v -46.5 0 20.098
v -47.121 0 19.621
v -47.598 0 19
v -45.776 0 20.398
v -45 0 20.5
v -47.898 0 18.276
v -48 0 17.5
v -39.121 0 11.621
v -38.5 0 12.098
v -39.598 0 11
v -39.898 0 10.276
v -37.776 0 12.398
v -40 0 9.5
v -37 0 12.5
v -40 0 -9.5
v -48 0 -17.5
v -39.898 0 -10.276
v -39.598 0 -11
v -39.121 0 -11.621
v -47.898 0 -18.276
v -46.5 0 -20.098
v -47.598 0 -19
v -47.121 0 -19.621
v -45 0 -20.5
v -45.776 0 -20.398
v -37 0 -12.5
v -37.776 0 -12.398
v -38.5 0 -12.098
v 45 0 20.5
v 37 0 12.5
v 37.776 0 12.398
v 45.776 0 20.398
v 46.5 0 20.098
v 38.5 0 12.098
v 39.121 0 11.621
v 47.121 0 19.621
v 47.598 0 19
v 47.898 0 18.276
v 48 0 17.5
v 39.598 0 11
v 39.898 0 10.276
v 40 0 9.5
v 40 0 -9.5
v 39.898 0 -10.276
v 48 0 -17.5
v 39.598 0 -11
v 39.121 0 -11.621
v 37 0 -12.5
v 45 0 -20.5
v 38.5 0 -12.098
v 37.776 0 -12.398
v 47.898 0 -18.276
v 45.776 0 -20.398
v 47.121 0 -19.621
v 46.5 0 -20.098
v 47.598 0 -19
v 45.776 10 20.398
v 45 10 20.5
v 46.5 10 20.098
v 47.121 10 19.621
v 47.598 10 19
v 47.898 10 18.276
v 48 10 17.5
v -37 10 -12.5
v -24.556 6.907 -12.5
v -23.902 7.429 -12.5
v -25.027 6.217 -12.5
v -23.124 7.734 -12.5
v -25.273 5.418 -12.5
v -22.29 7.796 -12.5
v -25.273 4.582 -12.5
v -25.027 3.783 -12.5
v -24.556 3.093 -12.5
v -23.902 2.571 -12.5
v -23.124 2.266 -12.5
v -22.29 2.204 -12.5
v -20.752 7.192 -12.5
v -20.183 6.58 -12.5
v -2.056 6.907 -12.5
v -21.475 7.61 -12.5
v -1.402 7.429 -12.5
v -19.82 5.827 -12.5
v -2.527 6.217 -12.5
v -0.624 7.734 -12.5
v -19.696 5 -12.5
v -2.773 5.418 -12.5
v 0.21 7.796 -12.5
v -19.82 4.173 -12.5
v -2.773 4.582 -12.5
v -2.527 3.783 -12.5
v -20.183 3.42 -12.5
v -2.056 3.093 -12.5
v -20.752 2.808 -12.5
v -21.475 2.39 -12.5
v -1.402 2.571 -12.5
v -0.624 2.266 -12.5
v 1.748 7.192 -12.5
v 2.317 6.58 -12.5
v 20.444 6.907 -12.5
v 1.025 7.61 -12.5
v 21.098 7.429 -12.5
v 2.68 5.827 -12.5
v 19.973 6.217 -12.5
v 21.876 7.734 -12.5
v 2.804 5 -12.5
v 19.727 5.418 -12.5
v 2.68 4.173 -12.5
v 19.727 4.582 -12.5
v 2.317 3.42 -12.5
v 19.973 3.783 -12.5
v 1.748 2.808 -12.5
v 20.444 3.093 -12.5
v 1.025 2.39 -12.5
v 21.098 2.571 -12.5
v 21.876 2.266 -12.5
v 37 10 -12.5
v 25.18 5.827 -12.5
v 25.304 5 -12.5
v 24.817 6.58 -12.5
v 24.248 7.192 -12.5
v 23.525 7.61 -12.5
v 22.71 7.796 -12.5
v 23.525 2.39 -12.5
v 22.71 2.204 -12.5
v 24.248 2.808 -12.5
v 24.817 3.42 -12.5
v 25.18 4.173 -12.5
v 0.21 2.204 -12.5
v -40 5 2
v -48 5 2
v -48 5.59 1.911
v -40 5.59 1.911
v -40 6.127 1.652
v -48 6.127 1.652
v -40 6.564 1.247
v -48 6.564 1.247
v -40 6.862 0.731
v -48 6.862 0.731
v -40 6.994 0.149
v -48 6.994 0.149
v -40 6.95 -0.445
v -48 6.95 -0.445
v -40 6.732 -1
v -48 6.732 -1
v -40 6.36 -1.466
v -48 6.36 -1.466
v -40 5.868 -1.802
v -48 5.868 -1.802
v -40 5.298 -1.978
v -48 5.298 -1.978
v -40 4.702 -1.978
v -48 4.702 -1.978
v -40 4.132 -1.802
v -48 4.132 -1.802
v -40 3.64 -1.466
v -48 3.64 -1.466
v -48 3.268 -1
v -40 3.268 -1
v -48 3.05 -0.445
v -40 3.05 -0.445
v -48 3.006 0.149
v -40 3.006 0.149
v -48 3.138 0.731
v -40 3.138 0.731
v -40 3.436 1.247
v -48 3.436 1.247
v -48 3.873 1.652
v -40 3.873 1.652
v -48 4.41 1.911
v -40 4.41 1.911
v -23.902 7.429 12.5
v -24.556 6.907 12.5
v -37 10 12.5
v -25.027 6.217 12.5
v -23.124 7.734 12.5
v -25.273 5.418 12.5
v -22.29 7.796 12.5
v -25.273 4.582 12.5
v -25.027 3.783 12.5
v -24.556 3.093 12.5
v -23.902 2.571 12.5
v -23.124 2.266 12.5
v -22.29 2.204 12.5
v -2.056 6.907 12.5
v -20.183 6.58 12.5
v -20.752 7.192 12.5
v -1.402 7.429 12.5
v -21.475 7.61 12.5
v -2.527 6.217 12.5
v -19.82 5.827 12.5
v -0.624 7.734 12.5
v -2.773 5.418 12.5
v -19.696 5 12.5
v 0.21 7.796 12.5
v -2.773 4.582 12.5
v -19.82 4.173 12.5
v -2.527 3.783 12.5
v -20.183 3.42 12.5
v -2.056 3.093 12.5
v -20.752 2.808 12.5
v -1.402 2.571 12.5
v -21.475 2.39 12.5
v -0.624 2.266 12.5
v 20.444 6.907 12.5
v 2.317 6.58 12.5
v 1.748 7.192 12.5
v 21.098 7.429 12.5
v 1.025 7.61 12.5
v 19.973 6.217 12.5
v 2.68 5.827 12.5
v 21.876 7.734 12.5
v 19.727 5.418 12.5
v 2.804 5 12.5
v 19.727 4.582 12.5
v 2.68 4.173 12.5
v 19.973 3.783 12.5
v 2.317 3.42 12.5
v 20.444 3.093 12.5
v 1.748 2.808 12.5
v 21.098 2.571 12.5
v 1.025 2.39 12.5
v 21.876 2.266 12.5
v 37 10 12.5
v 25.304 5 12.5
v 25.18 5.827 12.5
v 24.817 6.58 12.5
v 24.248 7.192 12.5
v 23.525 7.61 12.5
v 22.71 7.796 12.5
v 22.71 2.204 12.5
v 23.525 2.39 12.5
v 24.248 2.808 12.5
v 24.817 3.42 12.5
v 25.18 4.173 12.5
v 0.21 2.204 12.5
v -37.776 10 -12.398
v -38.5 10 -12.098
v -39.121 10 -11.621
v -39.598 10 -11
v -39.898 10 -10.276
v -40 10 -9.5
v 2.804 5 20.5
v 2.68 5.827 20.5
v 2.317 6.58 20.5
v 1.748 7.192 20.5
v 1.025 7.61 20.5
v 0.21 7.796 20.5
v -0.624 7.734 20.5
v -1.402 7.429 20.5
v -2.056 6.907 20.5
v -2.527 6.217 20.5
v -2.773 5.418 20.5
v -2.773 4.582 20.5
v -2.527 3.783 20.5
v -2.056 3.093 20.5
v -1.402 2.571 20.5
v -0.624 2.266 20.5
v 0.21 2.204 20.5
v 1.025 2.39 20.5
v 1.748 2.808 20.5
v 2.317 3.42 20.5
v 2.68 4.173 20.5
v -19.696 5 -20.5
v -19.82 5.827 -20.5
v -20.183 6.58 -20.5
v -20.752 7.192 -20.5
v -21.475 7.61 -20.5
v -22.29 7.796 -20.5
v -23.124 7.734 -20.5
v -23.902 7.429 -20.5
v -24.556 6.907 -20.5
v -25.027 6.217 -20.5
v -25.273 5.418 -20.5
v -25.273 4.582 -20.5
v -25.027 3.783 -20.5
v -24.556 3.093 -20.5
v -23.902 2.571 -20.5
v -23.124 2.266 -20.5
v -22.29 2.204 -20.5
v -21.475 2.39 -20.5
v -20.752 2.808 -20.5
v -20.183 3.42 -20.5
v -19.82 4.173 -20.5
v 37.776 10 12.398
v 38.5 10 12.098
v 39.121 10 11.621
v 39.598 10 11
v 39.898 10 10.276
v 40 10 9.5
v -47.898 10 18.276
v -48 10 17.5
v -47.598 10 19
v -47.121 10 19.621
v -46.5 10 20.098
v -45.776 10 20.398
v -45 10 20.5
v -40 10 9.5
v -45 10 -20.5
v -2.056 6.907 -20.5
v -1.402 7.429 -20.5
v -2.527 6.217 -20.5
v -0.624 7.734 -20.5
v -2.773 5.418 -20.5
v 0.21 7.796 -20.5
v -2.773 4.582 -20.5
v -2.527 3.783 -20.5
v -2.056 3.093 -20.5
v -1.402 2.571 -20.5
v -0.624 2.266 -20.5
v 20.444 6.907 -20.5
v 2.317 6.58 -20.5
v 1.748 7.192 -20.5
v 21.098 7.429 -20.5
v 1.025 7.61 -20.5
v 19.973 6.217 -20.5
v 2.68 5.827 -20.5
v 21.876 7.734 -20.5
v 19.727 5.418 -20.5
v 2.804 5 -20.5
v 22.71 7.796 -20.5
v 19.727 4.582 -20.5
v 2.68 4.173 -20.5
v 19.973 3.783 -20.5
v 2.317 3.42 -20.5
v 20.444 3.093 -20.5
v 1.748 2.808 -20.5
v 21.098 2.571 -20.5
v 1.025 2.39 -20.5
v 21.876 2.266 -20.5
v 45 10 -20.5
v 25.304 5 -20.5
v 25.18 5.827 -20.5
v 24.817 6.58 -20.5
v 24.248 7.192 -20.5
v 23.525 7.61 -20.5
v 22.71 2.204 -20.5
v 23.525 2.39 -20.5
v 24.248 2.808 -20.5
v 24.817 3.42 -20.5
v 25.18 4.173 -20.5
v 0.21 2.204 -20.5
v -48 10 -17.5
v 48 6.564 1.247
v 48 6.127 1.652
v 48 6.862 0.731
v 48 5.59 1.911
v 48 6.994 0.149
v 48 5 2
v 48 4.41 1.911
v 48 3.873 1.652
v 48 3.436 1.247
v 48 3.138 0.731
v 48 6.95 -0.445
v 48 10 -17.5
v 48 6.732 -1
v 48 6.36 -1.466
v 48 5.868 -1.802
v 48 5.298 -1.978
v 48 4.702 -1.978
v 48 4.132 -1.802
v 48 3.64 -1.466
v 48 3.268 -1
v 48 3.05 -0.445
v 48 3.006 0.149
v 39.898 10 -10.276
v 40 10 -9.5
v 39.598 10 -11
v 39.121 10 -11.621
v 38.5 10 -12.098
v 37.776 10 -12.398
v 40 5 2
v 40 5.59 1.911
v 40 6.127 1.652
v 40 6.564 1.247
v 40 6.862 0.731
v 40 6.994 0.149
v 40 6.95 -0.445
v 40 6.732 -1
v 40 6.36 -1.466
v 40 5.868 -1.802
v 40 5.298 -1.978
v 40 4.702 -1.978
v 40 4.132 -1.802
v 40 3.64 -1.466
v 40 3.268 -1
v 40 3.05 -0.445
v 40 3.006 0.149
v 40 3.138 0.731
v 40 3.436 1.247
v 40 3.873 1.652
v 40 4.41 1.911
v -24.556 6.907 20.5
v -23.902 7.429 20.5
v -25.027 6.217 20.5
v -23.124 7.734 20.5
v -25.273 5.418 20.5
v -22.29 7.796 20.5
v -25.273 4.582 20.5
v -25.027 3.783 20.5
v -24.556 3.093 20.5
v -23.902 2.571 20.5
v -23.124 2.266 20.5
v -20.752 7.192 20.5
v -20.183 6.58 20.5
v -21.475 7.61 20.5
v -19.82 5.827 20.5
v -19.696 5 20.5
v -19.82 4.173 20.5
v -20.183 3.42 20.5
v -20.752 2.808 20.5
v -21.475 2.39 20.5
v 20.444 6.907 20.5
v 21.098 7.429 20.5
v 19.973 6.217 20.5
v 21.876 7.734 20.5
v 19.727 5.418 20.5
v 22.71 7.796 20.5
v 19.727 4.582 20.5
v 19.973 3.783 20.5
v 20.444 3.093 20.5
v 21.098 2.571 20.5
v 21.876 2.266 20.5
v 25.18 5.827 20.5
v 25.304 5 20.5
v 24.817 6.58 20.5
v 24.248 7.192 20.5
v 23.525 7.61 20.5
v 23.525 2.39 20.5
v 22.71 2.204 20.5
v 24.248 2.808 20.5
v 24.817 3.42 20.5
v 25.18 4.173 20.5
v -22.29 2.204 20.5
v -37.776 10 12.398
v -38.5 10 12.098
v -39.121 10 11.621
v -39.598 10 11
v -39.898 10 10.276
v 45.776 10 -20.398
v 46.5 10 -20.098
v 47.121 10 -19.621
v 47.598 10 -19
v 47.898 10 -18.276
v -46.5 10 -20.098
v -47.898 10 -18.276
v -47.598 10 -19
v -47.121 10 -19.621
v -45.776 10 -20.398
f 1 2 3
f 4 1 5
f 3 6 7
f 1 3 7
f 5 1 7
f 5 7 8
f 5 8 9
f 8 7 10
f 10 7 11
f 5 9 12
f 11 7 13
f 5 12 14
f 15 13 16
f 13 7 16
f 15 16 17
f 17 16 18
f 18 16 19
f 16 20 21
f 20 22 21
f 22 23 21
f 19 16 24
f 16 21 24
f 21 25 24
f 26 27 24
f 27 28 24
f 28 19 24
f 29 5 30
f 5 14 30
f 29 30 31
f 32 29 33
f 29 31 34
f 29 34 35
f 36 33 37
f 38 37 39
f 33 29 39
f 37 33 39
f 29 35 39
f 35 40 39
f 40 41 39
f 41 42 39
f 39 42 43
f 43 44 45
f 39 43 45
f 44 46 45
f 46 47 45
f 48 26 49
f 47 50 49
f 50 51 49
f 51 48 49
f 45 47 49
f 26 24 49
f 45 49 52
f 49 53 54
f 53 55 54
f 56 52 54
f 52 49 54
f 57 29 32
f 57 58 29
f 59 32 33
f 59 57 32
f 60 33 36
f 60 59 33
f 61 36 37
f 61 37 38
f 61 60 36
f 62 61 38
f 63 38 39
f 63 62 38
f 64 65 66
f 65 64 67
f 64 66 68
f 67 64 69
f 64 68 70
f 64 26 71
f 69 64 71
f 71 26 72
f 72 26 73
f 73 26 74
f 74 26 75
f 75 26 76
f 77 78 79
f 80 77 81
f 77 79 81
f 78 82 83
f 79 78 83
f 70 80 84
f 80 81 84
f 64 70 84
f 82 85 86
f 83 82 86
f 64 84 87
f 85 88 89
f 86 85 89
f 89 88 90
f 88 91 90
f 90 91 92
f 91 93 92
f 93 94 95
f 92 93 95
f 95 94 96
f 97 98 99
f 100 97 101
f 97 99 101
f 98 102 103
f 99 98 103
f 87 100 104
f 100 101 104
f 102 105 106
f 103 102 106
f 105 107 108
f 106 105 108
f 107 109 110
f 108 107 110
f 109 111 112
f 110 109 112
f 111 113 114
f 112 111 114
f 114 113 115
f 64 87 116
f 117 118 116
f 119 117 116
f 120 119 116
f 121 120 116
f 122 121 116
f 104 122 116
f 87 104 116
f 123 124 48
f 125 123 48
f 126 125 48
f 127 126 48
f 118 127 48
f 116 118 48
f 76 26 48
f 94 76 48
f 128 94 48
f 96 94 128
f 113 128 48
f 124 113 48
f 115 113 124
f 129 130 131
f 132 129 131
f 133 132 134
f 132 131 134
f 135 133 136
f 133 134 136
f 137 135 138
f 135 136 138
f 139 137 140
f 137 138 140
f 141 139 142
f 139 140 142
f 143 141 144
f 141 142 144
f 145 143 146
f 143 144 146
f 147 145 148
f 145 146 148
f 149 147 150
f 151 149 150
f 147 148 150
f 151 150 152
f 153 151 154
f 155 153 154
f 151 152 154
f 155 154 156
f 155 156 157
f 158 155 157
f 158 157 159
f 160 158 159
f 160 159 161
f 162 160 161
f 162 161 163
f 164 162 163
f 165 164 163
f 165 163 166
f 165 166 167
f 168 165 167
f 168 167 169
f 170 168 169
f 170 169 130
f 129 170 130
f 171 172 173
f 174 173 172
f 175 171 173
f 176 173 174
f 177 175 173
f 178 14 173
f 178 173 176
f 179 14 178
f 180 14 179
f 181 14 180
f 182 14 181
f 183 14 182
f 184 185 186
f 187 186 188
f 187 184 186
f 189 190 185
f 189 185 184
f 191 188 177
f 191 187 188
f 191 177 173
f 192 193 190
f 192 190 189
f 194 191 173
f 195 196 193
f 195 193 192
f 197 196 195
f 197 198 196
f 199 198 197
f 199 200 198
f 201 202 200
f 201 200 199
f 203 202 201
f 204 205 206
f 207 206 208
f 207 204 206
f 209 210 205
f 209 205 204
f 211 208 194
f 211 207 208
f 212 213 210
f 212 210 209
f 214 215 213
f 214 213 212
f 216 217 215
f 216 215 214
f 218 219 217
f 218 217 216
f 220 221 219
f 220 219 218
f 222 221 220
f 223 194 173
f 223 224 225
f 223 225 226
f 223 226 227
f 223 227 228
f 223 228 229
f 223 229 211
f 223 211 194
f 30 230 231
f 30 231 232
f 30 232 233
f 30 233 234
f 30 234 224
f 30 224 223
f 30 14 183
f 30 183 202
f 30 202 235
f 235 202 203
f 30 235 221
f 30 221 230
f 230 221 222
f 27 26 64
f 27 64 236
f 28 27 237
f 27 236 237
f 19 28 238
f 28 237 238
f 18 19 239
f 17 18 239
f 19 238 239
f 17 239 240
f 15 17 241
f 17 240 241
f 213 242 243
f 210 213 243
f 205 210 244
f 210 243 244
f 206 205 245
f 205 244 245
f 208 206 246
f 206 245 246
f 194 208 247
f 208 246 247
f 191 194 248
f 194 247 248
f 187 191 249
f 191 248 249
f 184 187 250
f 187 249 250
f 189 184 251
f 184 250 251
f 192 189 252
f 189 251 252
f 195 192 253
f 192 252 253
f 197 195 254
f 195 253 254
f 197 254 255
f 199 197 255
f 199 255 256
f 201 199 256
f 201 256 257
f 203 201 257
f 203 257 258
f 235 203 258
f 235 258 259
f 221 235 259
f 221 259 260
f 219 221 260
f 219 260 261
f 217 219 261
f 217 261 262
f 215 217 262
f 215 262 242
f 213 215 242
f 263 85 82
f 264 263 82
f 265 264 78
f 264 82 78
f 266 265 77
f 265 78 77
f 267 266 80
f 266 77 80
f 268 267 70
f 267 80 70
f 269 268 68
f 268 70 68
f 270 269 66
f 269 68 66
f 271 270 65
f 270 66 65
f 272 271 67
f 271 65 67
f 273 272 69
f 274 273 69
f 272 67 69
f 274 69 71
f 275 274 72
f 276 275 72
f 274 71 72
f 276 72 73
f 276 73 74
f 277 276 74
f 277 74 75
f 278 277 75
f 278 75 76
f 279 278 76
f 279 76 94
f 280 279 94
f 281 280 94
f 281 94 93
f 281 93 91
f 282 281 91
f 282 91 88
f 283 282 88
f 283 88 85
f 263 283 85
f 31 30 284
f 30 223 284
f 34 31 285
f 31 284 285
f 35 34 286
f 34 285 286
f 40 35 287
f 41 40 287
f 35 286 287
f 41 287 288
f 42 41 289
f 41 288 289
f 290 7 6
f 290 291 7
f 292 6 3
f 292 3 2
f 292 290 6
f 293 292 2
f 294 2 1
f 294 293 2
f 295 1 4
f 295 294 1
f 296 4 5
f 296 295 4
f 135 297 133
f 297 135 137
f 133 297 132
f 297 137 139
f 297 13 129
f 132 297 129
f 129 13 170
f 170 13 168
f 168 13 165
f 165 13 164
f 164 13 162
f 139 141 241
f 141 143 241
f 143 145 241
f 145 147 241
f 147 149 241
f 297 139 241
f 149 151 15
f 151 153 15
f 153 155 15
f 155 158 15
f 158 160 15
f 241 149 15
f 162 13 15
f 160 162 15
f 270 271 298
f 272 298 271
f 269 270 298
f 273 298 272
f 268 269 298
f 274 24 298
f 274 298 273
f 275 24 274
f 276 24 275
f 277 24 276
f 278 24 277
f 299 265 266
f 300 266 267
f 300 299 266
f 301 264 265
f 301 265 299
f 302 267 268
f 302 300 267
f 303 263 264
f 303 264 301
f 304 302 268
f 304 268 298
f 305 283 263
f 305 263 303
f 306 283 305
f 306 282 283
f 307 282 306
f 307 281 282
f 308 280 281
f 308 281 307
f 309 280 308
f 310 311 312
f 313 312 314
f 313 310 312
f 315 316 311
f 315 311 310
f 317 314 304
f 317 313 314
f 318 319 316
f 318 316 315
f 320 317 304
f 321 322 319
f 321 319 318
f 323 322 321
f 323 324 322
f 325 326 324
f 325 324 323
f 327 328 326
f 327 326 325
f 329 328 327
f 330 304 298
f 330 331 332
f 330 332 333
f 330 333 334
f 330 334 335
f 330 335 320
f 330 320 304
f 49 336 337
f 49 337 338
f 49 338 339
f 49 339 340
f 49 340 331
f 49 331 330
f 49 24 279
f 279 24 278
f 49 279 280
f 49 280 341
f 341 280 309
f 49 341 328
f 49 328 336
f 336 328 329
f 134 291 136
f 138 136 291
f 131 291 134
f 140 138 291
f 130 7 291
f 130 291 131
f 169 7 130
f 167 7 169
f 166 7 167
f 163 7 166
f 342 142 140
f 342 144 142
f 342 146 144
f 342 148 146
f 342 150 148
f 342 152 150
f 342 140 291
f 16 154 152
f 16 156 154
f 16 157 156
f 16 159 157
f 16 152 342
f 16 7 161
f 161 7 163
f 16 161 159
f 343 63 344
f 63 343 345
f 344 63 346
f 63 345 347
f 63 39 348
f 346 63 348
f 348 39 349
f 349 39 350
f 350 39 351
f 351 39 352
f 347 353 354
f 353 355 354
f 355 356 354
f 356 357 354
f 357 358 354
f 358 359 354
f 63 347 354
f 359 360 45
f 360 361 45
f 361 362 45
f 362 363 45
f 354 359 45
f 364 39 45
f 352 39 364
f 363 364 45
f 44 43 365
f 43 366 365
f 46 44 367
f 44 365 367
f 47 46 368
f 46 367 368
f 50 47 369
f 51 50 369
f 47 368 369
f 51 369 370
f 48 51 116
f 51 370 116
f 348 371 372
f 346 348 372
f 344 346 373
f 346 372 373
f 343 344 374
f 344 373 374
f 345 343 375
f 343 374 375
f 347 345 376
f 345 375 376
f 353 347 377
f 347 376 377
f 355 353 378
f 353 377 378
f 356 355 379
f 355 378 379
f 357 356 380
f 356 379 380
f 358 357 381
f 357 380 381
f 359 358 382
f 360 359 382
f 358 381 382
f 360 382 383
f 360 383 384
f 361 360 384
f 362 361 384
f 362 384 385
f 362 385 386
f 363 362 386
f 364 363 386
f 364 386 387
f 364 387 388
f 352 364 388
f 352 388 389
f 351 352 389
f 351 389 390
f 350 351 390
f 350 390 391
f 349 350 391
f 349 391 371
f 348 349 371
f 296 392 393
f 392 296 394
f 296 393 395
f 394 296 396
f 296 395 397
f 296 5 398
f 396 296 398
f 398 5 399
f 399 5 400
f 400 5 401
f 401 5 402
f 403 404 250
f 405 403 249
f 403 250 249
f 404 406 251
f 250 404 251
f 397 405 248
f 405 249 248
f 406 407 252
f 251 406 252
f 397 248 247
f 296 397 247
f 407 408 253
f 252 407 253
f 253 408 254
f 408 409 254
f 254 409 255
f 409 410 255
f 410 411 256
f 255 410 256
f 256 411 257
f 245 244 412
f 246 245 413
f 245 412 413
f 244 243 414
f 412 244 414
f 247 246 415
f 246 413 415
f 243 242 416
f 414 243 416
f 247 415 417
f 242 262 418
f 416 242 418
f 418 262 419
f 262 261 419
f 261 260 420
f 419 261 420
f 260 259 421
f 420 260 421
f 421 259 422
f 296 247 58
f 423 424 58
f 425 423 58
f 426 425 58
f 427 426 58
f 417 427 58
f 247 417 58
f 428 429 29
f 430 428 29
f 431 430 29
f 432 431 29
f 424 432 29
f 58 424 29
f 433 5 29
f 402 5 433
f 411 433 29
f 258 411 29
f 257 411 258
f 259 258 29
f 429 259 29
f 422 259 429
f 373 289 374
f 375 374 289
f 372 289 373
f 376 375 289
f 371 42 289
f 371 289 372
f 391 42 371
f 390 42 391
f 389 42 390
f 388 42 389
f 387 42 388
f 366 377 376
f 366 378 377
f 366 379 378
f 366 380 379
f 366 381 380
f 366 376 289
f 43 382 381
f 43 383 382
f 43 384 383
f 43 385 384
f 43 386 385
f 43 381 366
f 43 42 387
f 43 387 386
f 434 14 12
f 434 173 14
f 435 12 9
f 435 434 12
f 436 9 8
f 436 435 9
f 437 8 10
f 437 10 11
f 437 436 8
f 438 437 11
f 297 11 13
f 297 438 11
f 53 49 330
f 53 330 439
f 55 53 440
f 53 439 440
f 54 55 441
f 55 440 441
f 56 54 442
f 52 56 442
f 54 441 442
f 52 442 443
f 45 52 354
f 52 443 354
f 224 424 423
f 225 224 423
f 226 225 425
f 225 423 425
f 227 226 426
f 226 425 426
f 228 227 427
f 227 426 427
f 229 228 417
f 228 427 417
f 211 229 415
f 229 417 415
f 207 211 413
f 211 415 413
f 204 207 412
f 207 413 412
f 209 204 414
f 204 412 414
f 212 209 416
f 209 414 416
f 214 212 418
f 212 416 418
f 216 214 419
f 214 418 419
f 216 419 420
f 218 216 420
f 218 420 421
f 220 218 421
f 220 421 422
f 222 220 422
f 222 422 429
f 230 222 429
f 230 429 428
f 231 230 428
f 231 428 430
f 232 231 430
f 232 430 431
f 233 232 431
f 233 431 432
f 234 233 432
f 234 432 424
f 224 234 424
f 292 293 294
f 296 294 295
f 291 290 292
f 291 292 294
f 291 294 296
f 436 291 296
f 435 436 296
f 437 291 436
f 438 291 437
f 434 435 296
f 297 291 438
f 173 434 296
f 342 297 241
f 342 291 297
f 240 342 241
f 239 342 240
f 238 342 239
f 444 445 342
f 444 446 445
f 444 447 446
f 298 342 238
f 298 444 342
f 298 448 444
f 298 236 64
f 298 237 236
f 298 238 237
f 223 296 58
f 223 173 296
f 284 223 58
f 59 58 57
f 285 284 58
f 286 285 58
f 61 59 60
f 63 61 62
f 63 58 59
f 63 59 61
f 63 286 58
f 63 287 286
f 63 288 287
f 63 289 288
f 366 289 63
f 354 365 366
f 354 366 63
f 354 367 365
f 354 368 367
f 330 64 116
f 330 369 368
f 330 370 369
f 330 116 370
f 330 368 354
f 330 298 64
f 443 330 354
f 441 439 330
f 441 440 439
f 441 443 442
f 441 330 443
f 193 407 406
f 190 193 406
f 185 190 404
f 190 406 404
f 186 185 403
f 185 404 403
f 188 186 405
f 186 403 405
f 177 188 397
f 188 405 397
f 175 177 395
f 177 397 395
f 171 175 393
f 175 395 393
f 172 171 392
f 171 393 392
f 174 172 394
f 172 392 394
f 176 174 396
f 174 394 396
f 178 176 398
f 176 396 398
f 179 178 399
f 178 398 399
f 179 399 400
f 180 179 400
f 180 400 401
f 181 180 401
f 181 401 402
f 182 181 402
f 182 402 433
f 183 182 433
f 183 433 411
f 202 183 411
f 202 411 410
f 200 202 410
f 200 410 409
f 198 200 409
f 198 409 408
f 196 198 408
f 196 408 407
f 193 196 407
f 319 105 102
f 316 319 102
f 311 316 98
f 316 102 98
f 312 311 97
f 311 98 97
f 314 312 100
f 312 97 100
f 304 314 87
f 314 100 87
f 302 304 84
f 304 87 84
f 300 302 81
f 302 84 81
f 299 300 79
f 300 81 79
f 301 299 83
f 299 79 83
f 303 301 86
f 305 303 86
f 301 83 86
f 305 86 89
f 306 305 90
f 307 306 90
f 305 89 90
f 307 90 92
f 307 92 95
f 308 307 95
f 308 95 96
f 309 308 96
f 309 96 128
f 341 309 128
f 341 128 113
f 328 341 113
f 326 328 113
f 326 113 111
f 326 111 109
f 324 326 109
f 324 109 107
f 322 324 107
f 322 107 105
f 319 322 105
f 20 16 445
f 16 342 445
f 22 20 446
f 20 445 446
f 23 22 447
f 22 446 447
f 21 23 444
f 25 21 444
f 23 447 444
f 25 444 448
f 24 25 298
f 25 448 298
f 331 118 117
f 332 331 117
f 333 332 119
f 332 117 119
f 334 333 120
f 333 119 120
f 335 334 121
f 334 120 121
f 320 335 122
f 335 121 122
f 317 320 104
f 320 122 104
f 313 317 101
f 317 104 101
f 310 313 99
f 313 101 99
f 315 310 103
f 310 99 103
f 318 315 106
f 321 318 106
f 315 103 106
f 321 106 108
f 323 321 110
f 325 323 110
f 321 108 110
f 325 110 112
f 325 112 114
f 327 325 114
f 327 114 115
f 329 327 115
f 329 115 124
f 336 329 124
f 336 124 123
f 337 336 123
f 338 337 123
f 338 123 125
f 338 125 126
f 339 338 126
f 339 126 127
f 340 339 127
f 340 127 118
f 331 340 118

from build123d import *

# Parameters (mm, degrees)
SKETCH1_W           = 96
SKETCH1_H           = 41
SKETCH1_W_2         = 80
SKETCH1_H_2         = 25
BOSS_EXTRUDE1_DEPTH = 10
FILLET1_R           = 3
SKETCH2_R           = 2
CUT_EXTRUDE1_DEPTH  = 99.672437894
SKETCH3_R           = 2.80429848
CUT_EXTRUDE5_DEPTH  = 64.914004725
FILLET2_R           = 3


with BuildPart() as part:
    # Sketch1 → Boss-Extrude1 (new body)
    with BuildSketch(Plane(origin=(0, 0, 0), x_dir=(1, 0, 0), z_dir=(0, 1, 0))):
        Rectangle(SKETCH1_W, SKETCH1_H)
        Rectangle(SKETCH1_W_2, SKETCH1_H_2, mode=Mode.SUBTRACT)
    extrude(amount=BOSS_EXTRUDE1_DEPTH)

    # Fillet1
    fillet1_edges = [part.edges().sort_by_distance(p)[0] for p in [
        (48, 5, 20.5),
        (-48, 5, 20.5),
        (-48, 5, -20.5),
        (48, 5, -20.5),
    ]]
    fillet(fillet1_edges, radius=FILLET1_R)

    # Sketch2 → Cut-Extrude1 (cut, through all)
    with BuildSketch(Plane.ZY.offset(48)):
        with Locations((0, 5)):
            Circle(SKETCH2_R)
    extrude(amount=-CUT_EXTRUDE1_DEPTH, mode=Mode.SUBTRACT)

    # Sketch3 → Cut-Extrude5 (cut, through all)
    with BuildSketch(Plane.XY.offset(20.5)):
        with Locations((-22.5, 5)):
            Circle(SKETCH3_R)
        with Locations((0, 5)):
            Circle(SKETCH3_R)
        with Locations((22.5, 5)):
            Circle(SKETCH3_R)
    extrude(amount=-CUT_EXTRUDE5_DEPTH, mode=Mode.SUBTRACT)

    # Fillet2
    fillet2_edges = [part.edges().sort_by_distance(p)[0] for p in [
        (40, 5, 12.5),
        (40, 5, -12.5),
        (-40, 5, -12.5),
        (-40, 5, 12.5),
    ]]
    fillet(fillet2_edges, radius=FILLET2_R)


solid = part.part
